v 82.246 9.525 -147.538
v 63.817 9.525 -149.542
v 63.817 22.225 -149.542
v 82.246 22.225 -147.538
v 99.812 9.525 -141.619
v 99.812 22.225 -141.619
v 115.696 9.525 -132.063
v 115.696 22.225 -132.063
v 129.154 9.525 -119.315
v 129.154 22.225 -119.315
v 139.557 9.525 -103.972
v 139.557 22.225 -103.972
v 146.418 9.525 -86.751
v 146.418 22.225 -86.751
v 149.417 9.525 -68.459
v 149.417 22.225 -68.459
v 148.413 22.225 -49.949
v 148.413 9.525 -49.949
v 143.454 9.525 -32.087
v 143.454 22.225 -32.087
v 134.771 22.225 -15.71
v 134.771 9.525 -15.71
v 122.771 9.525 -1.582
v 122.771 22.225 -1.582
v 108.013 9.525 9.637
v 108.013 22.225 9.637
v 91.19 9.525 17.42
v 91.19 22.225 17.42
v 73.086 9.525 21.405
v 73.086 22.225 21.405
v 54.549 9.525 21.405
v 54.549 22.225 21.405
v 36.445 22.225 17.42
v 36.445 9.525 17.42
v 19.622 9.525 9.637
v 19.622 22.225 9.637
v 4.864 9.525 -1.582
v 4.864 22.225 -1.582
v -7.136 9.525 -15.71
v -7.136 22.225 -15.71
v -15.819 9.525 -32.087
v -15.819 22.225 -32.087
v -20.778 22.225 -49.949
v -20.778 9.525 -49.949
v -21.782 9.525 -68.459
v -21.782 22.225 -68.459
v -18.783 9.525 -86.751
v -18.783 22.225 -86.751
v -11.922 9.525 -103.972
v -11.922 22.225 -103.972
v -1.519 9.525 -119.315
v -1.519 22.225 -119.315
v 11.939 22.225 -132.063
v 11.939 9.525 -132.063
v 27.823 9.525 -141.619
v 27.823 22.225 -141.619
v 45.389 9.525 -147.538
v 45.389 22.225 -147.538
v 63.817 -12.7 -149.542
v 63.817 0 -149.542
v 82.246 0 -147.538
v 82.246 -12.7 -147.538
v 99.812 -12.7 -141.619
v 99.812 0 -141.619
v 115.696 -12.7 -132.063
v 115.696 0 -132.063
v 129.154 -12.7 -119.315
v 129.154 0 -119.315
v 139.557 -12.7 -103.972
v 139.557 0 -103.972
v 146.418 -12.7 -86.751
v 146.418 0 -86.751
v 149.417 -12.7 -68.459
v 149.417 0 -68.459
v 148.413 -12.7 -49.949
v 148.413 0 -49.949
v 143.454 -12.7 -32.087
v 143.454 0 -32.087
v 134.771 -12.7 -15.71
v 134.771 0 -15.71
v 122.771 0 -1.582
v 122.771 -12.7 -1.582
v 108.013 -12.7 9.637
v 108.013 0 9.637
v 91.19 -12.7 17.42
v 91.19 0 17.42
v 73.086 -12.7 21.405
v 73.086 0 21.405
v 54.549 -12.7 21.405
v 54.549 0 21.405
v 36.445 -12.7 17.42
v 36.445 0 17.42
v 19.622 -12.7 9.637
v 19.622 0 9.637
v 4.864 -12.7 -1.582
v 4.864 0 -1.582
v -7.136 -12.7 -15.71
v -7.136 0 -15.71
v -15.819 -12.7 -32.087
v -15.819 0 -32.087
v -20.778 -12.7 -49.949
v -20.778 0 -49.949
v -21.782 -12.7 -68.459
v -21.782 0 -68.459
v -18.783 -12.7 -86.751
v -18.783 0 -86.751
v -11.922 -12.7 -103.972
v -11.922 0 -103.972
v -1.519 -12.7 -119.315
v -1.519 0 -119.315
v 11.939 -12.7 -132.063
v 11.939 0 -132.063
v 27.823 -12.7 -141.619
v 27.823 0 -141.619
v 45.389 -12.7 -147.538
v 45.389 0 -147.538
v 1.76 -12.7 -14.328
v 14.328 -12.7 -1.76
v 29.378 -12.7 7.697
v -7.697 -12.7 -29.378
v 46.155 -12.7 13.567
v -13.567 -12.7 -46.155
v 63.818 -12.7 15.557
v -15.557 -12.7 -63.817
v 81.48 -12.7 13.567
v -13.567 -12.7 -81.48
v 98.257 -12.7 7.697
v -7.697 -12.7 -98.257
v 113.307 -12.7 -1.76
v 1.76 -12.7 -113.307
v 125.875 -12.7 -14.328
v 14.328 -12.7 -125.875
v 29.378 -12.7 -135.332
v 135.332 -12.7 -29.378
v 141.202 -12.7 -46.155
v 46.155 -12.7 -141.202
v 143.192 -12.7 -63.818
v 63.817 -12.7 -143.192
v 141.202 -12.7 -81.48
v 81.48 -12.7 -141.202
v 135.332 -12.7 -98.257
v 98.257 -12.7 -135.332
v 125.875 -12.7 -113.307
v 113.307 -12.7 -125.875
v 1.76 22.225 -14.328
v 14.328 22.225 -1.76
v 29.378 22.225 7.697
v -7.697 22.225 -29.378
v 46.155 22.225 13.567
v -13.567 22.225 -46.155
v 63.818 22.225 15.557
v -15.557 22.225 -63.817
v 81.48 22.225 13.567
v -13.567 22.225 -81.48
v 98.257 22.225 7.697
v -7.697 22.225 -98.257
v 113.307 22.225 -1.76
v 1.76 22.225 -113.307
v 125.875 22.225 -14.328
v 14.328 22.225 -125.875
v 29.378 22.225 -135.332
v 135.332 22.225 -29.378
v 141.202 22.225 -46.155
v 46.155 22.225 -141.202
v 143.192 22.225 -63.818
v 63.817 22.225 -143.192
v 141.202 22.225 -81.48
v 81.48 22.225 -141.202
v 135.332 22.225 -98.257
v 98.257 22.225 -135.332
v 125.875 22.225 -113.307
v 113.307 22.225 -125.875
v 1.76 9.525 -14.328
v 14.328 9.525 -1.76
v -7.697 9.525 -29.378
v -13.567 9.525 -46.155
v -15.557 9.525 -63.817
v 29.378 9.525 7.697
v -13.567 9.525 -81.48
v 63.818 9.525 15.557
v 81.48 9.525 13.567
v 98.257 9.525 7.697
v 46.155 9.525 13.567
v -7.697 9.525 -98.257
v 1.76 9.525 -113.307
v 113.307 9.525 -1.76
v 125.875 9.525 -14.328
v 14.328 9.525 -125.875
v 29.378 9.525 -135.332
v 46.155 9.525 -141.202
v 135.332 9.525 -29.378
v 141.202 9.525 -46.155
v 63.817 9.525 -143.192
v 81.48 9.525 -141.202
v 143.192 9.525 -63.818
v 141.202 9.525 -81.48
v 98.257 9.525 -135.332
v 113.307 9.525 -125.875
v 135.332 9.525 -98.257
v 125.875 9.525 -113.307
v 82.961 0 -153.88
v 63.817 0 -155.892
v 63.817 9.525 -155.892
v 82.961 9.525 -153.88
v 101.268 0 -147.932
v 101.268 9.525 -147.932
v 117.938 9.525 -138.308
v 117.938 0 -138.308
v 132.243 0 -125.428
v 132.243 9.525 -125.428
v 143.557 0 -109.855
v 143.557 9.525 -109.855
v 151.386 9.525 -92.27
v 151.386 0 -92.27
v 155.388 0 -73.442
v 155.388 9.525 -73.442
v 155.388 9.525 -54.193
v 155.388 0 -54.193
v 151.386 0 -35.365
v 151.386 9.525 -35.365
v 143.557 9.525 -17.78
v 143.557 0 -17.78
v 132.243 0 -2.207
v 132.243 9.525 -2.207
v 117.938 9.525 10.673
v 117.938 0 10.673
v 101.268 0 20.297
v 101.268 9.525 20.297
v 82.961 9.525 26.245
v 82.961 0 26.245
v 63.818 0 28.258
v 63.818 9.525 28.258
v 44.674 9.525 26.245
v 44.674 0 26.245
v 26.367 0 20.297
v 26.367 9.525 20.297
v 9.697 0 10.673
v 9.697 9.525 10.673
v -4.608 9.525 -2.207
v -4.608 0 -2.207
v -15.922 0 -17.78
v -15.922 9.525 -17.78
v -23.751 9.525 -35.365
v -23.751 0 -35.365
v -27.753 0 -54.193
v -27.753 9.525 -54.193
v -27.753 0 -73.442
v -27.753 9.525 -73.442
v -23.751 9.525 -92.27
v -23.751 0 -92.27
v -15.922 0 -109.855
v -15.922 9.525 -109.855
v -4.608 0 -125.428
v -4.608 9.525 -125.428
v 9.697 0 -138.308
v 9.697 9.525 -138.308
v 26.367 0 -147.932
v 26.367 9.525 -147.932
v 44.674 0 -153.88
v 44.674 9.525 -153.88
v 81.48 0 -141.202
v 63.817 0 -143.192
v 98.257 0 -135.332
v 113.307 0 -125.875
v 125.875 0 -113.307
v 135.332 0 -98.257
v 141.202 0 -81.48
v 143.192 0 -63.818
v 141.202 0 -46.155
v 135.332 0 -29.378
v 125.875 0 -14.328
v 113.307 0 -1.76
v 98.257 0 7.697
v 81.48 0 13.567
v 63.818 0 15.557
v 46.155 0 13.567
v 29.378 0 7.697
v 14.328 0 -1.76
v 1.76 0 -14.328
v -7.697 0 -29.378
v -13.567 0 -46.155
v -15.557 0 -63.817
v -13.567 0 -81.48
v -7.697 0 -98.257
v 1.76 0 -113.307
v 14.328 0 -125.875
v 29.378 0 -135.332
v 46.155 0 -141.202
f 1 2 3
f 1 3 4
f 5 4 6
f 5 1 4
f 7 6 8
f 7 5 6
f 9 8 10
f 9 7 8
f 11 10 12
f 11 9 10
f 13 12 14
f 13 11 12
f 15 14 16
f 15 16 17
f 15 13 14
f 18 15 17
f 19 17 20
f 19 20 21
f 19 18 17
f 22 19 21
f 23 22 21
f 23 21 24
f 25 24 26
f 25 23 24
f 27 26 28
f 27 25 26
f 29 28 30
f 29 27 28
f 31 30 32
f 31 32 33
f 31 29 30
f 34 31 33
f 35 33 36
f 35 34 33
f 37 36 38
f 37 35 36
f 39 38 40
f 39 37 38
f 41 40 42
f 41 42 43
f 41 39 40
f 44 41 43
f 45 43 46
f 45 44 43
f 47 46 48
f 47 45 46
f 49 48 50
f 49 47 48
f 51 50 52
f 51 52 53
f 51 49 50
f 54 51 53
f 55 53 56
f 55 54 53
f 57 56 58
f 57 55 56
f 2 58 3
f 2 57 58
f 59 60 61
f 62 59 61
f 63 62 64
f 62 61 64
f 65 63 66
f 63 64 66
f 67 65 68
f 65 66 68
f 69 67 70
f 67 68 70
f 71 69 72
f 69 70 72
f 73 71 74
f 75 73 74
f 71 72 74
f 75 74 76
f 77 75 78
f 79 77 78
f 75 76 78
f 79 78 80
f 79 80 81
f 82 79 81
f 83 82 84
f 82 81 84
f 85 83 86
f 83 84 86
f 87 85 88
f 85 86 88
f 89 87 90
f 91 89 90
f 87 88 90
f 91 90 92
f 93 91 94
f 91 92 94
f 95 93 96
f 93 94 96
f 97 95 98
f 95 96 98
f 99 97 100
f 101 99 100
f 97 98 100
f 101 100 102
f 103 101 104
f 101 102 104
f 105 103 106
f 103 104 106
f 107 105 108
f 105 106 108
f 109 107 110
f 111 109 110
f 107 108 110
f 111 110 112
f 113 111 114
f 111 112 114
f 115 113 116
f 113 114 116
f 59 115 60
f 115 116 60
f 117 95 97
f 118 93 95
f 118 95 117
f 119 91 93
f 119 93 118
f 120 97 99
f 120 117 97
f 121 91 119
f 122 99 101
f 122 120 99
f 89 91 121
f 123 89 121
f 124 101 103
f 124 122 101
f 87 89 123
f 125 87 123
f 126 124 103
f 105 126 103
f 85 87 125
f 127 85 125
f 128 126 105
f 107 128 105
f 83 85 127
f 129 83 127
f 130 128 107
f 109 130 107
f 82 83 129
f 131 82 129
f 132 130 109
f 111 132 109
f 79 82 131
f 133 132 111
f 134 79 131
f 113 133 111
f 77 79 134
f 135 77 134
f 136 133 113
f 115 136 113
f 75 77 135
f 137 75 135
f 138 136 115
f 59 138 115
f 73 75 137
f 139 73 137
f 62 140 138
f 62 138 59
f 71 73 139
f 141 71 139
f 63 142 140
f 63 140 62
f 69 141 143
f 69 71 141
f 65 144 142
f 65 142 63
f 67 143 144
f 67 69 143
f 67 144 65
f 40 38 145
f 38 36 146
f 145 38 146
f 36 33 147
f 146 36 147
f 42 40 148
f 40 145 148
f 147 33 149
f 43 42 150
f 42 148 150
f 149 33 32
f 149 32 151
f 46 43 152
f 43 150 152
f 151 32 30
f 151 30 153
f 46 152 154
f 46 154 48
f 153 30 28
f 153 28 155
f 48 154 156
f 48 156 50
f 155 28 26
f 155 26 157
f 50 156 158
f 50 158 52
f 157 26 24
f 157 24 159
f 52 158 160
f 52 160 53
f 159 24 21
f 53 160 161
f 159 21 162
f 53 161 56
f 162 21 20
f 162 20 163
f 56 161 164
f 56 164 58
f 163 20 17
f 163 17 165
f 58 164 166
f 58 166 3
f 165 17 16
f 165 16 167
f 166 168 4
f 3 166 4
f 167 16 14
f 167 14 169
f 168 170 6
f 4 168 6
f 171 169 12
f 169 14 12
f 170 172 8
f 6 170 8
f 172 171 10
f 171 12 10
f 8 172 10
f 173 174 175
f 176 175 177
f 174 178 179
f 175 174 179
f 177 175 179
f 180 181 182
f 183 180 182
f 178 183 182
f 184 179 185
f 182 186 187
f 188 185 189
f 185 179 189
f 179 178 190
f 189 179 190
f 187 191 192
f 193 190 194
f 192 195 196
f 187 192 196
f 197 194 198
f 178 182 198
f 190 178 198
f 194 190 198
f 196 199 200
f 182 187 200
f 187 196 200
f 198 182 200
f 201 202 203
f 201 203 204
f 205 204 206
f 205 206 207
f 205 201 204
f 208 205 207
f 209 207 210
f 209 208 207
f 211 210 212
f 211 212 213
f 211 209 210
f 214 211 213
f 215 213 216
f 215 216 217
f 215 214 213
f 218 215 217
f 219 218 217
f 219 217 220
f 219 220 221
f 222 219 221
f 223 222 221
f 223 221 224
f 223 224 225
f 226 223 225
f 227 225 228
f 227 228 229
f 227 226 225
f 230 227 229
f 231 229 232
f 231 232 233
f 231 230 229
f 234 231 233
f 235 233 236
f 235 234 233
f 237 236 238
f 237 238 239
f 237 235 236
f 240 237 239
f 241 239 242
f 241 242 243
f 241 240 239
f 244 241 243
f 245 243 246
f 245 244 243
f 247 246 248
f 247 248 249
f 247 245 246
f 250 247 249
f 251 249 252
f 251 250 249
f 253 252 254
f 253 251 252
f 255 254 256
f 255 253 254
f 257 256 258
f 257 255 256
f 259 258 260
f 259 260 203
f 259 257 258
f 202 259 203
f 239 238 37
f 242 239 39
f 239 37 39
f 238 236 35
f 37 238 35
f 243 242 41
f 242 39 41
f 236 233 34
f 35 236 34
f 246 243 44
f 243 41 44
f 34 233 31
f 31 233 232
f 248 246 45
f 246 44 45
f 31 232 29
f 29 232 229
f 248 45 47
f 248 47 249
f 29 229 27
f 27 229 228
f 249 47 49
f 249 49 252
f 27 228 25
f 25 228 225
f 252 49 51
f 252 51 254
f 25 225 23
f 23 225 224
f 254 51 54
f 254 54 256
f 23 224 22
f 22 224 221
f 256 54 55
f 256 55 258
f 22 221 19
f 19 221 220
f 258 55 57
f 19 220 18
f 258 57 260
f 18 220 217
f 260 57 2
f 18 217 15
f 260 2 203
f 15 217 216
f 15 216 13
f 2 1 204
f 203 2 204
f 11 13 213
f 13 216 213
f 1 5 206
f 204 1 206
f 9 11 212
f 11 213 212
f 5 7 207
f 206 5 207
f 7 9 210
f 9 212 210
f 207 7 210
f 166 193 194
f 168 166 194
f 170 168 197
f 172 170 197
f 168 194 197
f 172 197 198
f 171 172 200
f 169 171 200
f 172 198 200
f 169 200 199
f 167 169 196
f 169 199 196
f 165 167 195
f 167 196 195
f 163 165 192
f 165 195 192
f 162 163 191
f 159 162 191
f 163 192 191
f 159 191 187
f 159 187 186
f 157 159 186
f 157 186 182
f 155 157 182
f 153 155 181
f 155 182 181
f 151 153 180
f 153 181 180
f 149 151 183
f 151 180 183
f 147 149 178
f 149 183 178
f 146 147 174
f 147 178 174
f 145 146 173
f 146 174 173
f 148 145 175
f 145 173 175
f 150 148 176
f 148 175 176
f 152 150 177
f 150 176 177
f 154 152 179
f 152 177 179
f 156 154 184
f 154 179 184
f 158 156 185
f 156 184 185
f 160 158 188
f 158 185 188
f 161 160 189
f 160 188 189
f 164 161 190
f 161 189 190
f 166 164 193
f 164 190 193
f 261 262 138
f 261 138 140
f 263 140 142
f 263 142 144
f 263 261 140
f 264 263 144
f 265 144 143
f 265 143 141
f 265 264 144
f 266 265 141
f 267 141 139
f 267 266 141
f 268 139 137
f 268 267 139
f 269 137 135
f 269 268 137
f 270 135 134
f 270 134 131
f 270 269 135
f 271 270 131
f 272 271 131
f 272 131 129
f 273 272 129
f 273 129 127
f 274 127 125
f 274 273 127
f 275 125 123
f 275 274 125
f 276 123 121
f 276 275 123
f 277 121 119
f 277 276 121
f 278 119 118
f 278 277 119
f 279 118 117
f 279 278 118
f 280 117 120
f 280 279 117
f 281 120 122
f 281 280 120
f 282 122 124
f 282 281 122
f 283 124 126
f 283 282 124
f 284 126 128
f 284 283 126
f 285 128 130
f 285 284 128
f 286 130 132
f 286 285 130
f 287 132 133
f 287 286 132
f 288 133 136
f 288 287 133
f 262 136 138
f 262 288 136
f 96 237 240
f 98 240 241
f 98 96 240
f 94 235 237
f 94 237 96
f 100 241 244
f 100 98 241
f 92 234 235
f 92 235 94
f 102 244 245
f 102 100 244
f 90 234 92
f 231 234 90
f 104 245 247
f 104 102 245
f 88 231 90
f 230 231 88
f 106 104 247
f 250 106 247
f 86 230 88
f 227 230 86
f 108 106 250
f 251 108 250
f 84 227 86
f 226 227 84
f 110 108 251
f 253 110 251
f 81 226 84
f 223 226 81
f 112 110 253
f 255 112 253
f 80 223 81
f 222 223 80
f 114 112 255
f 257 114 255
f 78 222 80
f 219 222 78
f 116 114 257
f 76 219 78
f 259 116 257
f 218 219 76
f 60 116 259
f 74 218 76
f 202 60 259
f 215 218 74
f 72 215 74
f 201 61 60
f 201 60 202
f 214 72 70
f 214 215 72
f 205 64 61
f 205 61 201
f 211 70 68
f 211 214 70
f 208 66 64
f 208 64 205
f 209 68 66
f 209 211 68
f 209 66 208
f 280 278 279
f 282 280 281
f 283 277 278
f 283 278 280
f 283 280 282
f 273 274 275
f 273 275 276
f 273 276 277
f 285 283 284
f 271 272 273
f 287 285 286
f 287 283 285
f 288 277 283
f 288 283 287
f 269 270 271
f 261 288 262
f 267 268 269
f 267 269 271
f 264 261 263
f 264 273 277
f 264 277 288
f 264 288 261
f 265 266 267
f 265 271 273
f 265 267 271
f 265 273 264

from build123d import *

# Parameters (mm, degrees)
SKETCH1_W           = 127.635
SKETCH1_H           = 127.635
BOSS_EXTRUDE1_DEPTH = 9.525
SKETCH12_R          = 92.075
BOSS_EXTRUDE2_DEPTH = 9.525
SKETCH30_R          = 85.725
SKETCH30_R_2        = 79.375
BOSS_EXTRUDE3_DEPTH = 12.7


with BuildPart() as part:
    # Sketch1 → Boss-Extrude1 (new body)
    with BuildSketch(Plane(origin=(0, 0, 0), x_dir=(1, 0, 0), z_dir=(0, 1, 0))):
        with Locations((63.8175, 63.8175)):
            Rectangle(SKETCH1_W, SKETCH1_H)
    extrude(amount=BOSS_EXTRUDE1_DEPTH)

    # Sketch12 → Boss-Extrude2 (add)
    with BuildSketch(Plane.XZ):
        with Locations(Location((63.8175, -63.8175, 0), (0, 0, 270))):
            Circle(SKETCH12_R)
    extrude(amount=-BOSS_EXTRUDE2_DEPTH)

    # Sketch30 → Boss-Extrude3 (add)
    with BuildSketch(Plane.XZ):
        with Locations(Location((63.8175, -63.8175, 0), (0, 0, 270))):
            Circle(SKETCH30_R)
        with Locations(Location((63.8175, -63.8175, 0), (0, 0, 270))):
            Circle(SKETCH30_R_2, mode=Mode.SUBTRACT)
    boss_extrude3 = extrude(amount=BOSS_EXTRUDE3_DEPTH)

    # Mirror1: Boss-Extrude3 across plane
    add(boss_extrude3.mirror(Plane.ZX.offset(4.7625)))


solid = part.part
